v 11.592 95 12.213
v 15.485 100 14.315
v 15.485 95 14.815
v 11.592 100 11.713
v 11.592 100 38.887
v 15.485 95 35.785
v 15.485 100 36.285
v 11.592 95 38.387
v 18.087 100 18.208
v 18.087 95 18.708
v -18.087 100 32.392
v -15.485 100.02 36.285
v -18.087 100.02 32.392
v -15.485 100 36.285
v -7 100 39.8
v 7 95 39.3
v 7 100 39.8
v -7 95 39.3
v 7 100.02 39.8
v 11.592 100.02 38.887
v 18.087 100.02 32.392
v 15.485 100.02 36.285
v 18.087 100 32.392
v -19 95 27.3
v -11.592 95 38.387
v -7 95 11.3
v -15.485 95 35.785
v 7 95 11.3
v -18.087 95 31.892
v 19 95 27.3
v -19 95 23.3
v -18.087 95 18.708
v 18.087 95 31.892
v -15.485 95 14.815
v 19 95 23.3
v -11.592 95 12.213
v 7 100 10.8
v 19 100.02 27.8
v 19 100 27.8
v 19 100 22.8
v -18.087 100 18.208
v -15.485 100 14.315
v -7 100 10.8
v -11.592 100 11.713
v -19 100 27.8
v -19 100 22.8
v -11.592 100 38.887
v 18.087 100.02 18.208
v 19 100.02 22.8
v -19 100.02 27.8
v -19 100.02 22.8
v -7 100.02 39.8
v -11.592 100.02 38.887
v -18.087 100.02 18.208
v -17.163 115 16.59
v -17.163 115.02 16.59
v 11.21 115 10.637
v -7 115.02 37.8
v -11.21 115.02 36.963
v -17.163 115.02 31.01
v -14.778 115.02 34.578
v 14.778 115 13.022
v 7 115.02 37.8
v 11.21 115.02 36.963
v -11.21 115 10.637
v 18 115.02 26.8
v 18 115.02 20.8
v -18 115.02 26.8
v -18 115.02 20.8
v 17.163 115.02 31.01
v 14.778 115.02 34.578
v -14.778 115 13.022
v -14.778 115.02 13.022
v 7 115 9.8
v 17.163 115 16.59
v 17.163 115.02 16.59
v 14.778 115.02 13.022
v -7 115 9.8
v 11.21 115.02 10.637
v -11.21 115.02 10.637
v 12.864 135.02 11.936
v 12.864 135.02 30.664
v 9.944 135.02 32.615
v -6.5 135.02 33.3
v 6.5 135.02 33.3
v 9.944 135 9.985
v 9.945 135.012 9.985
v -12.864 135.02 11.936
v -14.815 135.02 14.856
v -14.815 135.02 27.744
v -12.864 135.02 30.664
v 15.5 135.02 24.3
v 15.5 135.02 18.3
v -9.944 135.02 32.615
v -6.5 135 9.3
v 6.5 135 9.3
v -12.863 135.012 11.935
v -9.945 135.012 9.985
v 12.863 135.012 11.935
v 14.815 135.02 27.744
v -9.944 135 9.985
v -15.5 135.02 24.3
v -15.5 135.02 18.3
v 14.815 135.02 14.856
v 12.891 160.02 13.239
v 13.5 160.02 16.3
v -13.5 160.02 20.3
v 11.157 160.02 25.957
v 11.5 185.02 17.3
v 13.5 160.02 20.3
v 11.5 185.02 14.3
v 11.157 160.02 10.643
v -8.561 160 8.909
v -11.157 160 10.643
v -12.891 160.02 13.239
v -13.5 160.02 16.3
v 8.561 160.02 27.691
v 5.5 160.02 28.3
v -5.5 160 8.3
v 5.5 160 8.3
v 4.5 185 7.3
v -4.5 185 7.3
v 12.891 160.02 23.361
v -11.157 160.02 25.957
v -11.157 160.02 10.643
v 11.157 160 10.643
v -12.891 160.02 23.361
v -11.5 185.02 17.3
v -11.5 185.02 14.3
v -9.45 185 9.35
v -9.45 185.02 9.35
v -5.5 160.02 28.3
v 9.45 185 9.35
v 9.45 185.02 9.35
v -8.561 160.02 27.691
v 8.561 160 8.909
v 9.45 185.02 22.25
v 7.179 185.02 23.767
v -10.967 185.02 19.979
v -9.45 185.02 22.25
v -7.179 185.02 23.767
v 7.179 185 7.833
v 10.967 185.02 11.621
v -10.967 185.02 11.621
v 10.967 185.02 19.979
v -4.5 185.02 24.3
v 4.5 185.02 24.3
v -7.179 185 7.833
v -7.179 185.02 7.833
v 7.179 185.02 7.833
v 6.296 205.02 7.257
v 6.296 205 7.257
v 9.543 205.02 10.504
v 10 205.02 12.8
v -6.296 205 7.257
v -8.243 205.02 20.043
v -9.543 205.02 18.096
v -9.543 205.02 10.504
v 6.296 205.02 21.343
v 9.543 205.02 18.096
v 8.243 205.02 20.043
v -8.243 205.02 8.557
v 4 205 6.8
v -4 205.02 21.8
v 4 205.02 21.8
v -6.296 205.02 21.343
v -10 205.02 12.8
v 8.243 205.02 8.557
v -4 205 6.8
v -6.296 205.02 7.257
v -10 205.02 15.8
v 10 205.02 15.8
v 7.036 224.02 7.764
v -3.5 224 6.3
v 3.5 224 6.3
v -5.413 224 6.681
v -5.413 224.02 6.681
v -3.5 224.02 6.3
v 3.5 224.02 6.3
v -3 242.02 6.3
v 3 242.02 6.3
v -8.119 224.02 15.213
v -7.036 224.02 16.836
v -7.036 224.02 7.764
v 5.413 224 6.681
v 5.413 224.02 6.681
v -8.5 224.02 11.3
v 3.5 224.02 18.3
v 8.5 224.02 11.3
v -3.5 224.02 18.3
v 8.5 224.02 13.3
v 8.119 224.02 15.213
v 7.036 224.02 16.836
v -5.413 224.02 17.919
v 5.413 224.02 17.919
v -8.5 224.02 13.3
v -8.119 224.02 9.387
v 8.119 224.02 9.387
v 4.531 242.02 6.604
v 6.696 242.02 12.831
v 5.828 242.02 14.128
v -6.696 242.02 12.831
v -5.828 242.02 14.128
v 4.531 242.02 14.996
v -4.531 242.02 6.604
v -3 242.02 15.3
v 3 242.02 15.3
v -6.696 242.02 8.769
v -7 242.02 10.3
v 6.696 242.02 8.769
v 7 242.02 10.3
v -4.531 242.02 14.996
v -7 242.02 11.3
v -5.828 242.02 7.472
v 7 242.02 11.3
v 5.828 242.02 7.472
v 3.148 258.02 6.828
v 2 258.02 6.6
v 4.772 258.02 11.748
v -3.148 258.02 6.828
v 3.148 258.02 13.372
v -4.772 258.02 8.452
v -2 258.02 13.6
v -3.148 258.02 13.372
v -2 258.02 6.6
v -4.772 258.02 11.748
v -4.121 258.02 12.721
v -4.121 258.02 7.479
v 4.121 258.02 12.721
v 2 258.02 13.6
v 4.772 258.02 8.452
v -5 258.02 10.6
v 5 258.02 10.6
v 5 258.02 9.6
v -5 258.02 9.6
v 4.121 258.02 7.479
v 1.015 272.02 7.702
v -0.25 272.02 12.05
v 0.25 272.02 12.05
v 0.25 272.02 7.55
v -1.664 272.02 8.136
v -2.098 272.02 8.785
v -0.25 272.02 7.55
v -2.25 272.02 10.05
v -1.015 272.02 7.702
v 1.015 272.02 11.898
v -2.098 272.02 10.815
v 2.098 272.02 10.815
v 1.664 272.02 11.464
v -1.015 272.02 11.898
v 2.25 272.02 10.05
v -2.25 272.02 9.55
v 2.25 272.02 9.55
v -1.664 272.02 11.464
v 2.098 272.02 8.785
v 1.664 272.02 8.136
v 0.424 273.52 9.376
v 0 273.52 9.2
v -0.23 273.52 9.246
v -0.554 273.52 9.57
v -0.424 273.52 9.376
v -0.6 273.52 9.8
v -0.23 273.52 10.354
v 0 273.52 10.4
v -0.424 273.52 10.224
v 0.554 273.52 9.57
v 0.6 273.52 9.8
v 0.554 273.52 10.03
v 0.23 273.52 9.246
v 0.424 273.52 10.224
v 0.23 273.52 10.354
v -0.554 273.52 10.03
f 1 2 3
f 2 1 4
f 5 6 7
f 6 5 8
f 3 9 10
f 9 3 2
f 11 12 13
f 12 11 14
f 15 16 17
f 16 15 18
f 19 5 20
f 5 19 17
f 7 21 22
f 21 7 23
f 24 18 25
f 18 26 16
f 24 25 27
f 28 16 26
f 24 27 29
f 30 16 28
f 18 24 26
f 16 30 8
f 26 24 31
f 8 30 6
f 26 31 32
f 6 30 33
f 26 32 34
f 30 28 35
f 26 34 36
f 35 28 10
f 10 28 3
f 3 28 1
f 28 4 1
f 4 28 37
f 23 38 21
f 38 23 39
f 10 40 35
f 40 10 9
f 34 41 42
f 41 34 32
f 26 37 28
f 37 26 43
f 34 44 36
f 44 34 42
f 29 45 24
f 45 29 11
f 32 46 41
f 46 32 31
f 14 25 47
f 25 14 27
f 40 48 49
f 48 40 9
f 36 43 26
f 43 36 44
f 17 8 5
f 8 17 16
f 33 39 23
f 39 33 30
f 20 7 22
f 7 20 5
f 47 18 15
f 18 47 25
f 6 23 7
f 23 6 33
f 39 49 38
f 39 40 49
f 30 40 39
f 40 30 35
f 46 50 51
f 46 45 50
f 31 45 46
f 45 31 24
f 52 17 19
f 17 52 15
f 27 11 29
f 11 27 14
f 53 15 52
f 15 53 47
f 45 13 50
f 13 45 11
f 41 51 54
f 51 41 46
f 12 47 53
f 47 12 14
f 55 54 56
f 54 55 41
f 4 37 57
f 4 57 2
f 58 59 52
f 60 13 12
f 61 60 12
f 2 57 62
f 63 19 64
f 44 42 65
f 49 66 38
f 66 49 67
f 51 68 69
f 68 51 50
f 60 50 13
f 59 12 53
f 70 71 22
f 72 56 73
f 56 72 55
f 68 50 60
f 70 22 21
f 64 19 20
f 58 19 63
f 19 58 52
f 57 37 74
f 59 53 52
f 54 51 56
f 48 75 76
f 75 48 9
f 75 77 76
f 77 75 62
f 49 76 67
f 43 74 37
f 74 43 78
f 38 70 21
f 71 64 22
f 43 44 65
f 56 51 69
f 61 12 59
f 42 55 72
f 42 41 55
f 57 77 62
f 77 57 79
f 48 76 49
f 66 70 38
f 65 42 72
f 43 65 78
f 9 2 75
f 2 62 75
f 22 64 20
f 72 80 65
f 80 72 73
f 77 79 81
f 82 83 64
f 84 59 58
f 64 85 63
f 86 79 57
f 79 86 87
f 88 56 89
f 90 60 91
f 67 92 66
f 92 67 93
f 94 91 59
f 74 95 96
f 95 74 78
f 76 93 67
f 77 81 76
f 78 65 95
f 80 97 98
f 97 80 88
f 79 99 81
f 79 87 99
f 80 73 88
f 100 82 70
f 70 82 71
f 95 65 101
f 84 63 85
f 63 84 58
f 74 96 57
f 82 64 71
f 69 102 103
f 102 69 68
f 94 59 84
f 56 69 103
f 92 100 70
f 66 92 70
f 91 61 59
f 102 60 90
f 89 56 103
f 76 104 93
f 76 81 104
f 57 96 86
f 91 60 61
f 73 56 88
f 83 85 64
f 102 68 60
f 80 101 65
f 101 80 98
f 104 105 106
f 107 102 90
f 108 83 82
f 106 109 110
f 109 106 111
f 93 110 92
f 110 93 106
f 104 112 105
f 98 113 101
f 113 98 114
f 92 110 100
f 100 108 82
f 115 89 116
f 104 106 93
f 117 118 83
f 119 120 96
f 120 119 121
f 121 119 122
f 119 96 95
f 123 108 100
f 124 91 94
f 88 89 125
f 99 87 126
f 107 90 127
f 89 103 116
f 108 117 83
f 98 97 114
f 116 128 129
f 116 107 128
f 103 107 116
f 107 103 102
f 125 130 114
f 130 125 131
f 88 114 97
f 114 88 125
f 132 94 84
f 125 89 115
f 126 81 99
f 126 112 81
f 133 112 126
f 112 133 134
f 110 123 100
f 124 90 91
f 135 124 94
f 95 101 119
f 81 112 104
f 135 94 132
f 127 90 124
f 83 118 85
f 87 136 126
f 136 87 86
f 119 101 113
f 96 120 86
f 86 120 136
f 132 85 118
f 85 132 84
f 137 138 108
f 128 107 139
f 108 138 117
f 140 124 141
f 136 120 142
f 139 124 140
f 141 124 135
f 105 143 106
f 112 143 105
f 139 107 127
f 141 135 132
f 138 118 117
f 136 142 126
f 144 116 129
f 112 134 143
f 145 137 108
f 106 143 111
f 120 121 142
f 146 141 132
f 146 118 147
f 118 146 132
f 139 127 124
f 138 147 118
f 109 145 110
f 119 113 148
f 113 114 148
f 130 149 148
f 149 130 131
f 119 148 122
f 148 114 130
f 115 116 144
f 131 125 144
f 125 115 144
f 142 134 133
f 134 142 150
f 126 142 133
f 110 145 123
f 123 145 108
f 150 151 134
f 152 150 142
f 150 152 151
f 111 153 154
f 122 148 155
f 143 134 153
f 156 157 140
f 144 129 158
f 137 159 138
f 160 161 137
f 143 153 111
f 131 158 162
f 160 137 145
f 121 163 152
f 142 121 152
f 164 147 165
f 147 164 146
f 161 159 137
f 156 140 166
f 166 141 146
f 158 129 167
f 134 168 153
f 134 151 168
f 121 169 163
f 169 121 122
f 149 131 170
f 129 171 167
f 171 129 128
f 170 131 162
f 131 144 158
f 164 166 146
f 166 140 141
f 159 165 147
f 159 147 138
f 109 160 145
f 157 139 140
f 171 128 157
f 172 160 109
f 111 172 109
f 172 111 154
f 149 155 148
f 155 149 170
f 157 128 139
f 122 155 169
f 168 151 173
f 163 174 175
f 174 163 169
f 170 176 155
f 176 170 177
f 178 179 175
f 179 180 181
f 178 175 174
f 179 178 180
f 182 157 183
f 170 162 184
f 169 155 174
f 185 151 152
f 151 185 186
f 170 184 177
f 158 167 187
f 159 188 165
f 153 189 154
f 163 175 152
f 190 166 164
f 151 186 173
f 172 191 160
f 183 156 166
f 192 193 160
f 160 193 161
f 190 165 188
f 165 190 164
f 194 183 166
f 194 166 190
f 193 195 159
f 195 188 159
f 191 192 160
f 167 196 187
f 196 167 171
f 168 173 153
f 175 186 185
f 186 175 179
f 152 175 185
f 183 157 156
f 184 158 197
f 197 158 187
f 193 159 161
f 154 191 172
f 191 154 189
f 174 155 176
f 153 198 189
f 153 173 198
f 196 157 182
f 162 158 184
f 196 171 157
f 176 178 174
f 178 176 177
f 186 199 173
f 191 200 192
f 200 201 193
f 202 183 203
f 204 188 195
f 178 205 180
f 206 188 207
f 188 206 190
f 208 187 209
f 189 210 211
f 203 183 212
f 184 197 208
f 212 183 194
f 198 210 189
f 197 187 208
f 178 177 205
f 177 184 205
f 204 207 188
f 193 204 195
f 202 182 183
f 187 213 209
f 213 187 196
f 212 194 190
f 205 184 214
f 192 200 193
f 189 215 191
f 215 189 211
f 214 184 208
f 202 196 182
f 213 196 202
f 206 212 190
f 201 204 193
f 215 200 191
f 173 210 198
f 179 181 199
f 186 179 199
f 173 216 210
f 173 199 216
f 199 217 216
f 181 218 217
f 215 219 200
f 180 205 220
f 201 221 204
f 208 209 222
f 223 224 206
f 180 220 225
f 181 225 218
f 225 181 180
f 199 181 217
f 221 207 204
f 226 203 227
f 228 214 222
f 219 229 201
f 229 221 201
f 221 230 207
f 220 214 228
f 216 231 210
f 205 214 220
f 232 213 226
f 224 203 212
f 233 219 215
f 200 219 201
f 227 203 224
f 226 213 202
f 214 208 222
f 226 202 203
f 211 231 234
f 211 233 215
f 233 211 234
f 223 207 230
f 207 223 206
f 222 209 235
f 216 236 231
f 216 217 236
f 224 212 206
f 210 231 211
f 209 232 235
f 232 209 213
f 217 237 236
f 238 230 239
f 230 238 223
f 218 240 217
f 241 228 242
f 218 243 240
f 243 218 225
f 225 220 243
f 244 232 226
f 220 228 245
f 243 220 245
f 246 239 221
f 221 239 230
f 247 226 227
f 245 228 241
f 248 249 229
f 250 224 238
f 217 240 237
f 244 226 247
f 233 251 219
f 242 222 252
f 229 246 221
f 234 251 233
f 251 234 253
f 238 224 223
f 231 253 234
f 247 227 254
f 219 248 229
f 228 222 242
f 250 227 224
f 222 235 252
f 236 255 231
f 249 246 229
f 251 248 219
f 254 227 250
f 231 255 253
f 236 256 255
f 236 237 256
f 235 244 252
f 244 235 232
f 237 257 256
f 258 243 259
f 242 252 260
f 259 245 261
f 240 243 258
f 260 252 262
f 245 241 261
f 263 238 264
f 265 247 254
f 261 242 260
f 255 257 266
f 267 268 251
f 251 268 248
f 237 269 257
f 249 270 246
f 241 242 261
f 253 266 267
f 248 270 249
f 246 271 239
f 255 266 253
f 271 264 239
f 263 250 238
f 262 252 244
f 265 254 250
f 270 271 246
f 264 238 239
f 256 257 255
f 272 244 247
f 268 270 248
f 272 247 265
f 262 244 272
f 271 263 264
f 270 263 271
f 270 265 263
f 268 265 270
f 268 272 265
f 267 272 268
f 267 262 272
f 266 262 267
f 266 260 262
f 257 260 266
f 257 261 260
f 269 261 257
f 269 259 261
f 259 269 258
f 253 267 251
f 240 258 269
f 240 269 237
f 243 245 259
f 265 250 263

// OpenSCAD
// file: ../lib.scad
// ===== 공용 프리미티브 (params 의존 없음 — use로 포함. 함정 1) =====

// 두 점을 잇는 캡슐. 끝단이 od/2 만큼 뻗는다 (함정 3)
module rod(p1, p2, od, fn = 56)
    hull() { translate(p1) sphere(d = od, $fn = fn);
             translate(p2) sphere(d = od, $fn = fn); }

function mir(p, s = 1) = [s * p.x, p.y, p.z];

// --- 라운디드 사각 2D 폴리곤 (CCW) ---
function arc_pt(cx, cy, r, a) = [cx + r * cos(a), cy + r * sin(a)];
function rrpts(w, h, r, n = 4) =
    let (x = w / 2 - r, y = h / 2 - r)
    concat(
        [for (i = [0:n]) arc_pt( x, -y, r, -90 + 90 * i / n)],
        [for (i = [0:n]) arc_pt( x,  y, r,   0 + 90 * i / n)],
        [for (i = [0:n]) arc_pt(-x,  y, r,  90 + 90 * i / n)],
        [for (i = [0:n]) arc_pt(-x, -y, r, 180 + 90 * i / n)]);

// y 위치의 XZ 단면 슬래브 (중심 x0/zc, 폭 w/높이 h, 모서리 r).
// 회전 매핑: 2D x→차량 X, 2D y→차량 Z, 돌출 +z→−Y (y..y+0.02 전방 전용, 함정 20)
module slabr(y, x0, w, h, zc, r)
    translate([x0, y + 0.02, zc]) rotate([90, 0, 0])
        linear_extrude(0.02) polygon(rrpts(w, h, r));

// 단면 체인 loft: sec = [[y, x0, w, h, zc, r], ...]
module loftr(sec)
    for (i = [0 : len(sec) - 2])
        hull() {
            slabr(sec[i][0],     sec[i][1],     sec[i][2],     sec[i][3],     sec[i][4],     sec[i][5]);
            slabr(sec[i + 1][0], sec[i + 1][1], sec[i + 1][2], sec[i + 1][3], sec[i + 1][4], sec[i + 1][5]);
        }

// 라운디드 박스 (z0..z1 수직, 평면 모서리 r)
module rbox(xc, yc, z0, z1, dx, dy, r, fn = 32)
    hull() for (px = [-1, 1], py = [-1, 1])
        translate([xc + px * (dx / 2 - r), yc + py * (dy / 2 - r), z0])
            cylinder(r = r, h = z1 - z0, $fn = fn);

// --- NACA 계열 에어포일 (LE 원점, 2D +x = 현 방향) ---
function _yt(x, c, t) = 5 * t * c * (0.2969*sqrt(x) - 0.1260*x - 0.3516*x*x
    + 0.2843*x*x*x - 0.1036*x*x*x*x);
function _yc(x, c, m) = 4 * m * c * x * (1 - x);
function naca_pts(c, t, m, n = 12) =
    concat(
        [for (i = [0:n])     let (x = i / n)     [x*c,  _yt(x, c, t) + _yc(x, c, m)]],
        [for (i = [n-1:-1:0]) let (x = i / n)    [x*c, -_yt(x, c, t) + _yc(x, c, m)]]);

// 슬라이스 3D 링: v=[x, yle, zle, c, aoa, th, cam] → 받각 회전된 naca 점의 링
// (th/cam은 mm — 현 대비 비율로 정규화)
function wring(v, n = 12) =
    let (c = v[3], t = v[5] / c, m = v[6] / c, pts = naca_pts(c, t, m, n),
         ca = cos(v[4]), sa = sin(v[4]))
    // 코드 방향 (ca,sa) + 두께/캠버 수직 방향 (-sa,ca) — 2D y 누락 금지
    [for (p = pts) [v[0], v[1] + p[0] * ca - p[1] * sa, v[2] + p[0] * sa + p[1] * ca]];

// 진짜 로프트 윙 — polyhedron 스트립. hull 체인은 캠버진 하면을 볼록 껍질로
// 채워(LE→TE 직선 웨지) 요소가 처지므로 쓰지 않는다
module wing3(sl, n = 12) {
    rings = [for (v = sl) wring(v, n)];
    ns = len(rings);
    m = len(rings[0]);
    pts = [for (r = rings, p = r) p];
    function ix(i, k) = i * m + (k % m);
    faces = concat(
        // 측면 스트립 (사중면 → 삼각형 2) — 외향 노멀 권선(캡과 일치)
        [for (i = [0 : ns - 2], k = [0 : m - 1])
            each [[ix(i, k), ix(i, k + 1), ix(i + 1, k + 1)],
                  [ix(i, k), ix(i + 1, k + 1), ix(i + 1, k)]]],
        // 끝 캡 (링은 단순 폴리곤 — 팬 삼각분할)
        [for (k = [1 : m - 2]) [ix(0, 0), ix(0, k + 1), ix(0, k)]],
        [for (k = [1 : m - 2]) [ix(ns - 1, 0), ix(ns - 1, k), ix(ns - 1, k + 1)]]
    );
    polyhedron(points = pts, faces = faces, convexity = 4);
}

// 반쪽 슬라이스 → x-대칭 전체. 규약: half는 센터(x=0)→팁 순서(내림차순 x).
// 결과는 x 오름차순 체인. x=0 센터만 중복 제외 (그 외 전부 미러)
function wsym(half) =
    concat([for (i = [len(half) - 1 : -1 : 0]) half[i]],
           [for (i = [0 : len(half) - 1]) if (abs(half[i][0]) > 1e-9)
               concat([-half[i][0]], [for (j = [1 : len(half[i]) - 1]) half[i][j]])]);

// 환(링), 축 Z
module ann(r_in, r_out, h, fn = 96)
    difference() { cylinder(r = r_out, h = h, center = true, $fn = fn);
                   cylinder(r = r_in,  h = h + 2, center = true, $fn = fn); }

// 리스트 전체 x반전+순서 역행 (센터 구간 없는 플랩 등 — 좌우 별도 wing3 호출용).
// x반전만 하면 행렬식이 음수가 되어 권선이 뒤집힌다 → 순서 역행으로 상쇄
function msym(half) =
    [for (i = [len(half) - 1 : -1 : 0])
        concat([-half[i][0]], [for (j = [1 : len(half[i]) - 1]) half[i][j]])];
// file: ../params.scad
// =====================================================================
// F1 그랜드파이언스 카 1:10 — 전체 파라미터 (유일한 수정 지점)
// 좌표계: +Y 전방, +X 좌측, +Z 상방, 지면 z=0, 원점=휠베이스 중심
// 전장 558 (y -268..+278), 전폭 194, 휠베이스 360, 타이어 OD 72 (720mm)
// 30부품. loftr 단면 = [y, x0, w, h, zc, r] (XZ 단면, y..y+0.02 슬래브)
// wing3 슬라이스 = [x, yle, zle, c, aoa, th, cam]
//   aoa: 현 방향의 X축 회전각. 전방 받각 요소는 165~170 (TE가 뒤+위)
// =====================================================================
$fn = 96;

// -- 휠/액슬 (실차 720mm 타이어, 18인치 림, 트랙 F1600/R1550) --
AXF_Y = 180;   AXR_Y = -180;
WHF_X = 80;    WHR_X = 77.5;
WH_Z  = 36;
TIRF_W = 30.5; TIRR_W = 40.5;  TIR_R = 36;
TIR_FN = 288;                 // 타이어 회전체 해상도
RIM_R = 23.2;  RIM_T = 1.0;   // 림 배럴 반경/두께
RIM_LF = 12.4; RIM_LR = 17.4; // 림 배럴 반폭
HUB_BORE = 7.0; STUB_D = 6.2; // 방사 간극 0.4
DISC_R = 15.5;                // 브레이크 디스크

// -- 바디 공통 레벨 --
FLO_Z0 = 2.0;  FLO_Z1 = 5.5;  // 플로어 (두께 3.5)
BOD_Z0 = 5.65;                // 샤시/카버/기어박스 바닥 (플로어 위 0.15)
J = 0.15;                     // 부품 접합 기본 간극
ARM_OD = 3.4;                 // 서스펜션 암 캡슐 직경

// ===== 01 플로어 =====
FLOOR_SEC = [
    [132,    0,  92, 3.5, 3.75, 1.5], [100, 0, 118, 3.5, 3.75, 1.5],
    [60,     0, 130, 3.5, 3.75, 2.0], [10,  0, 132, 3.5, 3.75, 2.0],
    [-60,    0, 128, 3.5, 3.75, 2.0], [-120, 0, 112, 3.5, 3.75, 2.0],
    [-161.85, 0, 100, 3.5, 3.75, 2.0]];

// ===== 02 디퓨저 (램프 + 스트레이크는 부품 내부) =====
DIFF_SEC = [
    [-230,   0, 100, 10.0, 11.0, 1.5], [-215, 0, 100, 8.0,  9.0, 1.5],
    [-190,   0, 100,  6.0,  6.2, 1.5], [-162.0, 0, 100, 4.0, 4.15, 1.5]];
DIFF_TOP = [[-175, 7.8], [-205, 11.9], [-228, 15.6]];  // (y, 램프 상면 z)

// ===== 03 플로어 에지 윙 =====
FEW_SEC = [   // [y, x0, w, h, zc, r] — x0 부호로 좌우
    [55,   63.5, 3.0, 2.0, 6.65, 1.0], [-5,  65.5, 3.0, 5.5, 8.40, 1.5],
    [-70,  63.0, 3.0, 4.0, 7.65, 1.5], [-120, 58.0, 3.0, 3.0, 7.15, 1.5]];
FEW2_SEC = [
    [100, 57.0, 2.5, 1.5, 6.40, 0.8], [60, 60.0, 2.5, 2.0, 6.65, 0.8]];

// ===== 04 노우즈 =====
NOSE_SEC = [
    [95,   0, 38, 28, 25.3, 12], [100,  0, 38, 29, 25.3, 12],
    [115,  0, 36, 28, 23.8, 11], [135,  0, 31, 24, 21.3,  9],
    [160,  0, 27, 20, 18.3,  8], [185,  0, 23, 17, 15.8,  7],
    [205,  0, 20, 15, 14.3,  6], [224,  0, 17, 12, 12.3,  5],
    [242,  0, 14,  9, 10.8,  4], [258,  0, 10,  7, 10.1,  3],
    [272,  0,  4.5, 4.5, 9.8, 2], [273.5, 0, 1.2, 1.2, 9.8, 0.6]];

// ===== 05 샤시(모노코크) + 콕핏 컷 =====
CHAS_SEC = [
    [-34.85, 0, 46, 44, 27.65, 15], [-10, 0, 48, 46, 28.65, 15],
    [20,     0, 48, 44, 27.65, 15], [60,  0, 46, 40, 25.65, 14],
    [94.85,  0, 42, 34, 22.65, 12]];
CKP_CUT = [[62, 0, 34, 32, 46, 3], [-30, 0, 34, 30, 45, 3]];

// ===== 06 엔진 커버 + 샤크핀 =====
COV_SEC = [
    [-152,   0,  8, 14, 35.65,  6], [-140, 0, 12, 18, 32.65,  7],
    [-120,   0, 18, 24, 29.65,  9], [-95,  0, 26, 30, 26.15, 11],
    [-70,    0, 34, 36, 25.65, 13], [-50,  0, 40, 40, 25.65, 14],
    [-35.15, 0, 44, 42, 26.65, 15]];
FIN_SEC = [
    [-162, 0, 2.2, 44, 62.0, 1], [-120, 0, 2.5, 30, 56.0, 1],
    [-92.2, 0, 2.5, 10, 45.0, 1]];

// ===== 07 에어박스 (험프 + 인테이크 링) =====
ABX_SEC = [
    [-92, 0, 14, 17, 50.00, 6], [-68, 0, 20, 24, 56.60, 8],
    [-46, 0, 22, 26, 59.60, 8], [-34, 0, 22, 13, 56.30, 6]];
ABX_RING_C = [0, -45, 73.5];  ABX_RING_R = 11;  ABX_RING_T = 4.5;
ABX_RING_SZ = 0.72;

// ===== 08 사이드포드 (x0=±41.5) =====
SPOD_X0 = 41.5;
SPOD_SEC = [   // [y, w, h, zc, r]
    [38,   34, 26, 18.65, 8], [5,   34, 28, 19.65, 9], [-25,  34, 26, 18.65, 9],
    [-55,  32, 21, 18.15, 8], [-80, 30, 15, 17.15, 8], [-100, 26,  9, 16.15, 7]];
SPOD_INLET = [24, 18, 19, 2.3];  // 컷: w, h, zc, 깊이

// ===== 09 할로 =====
HALO_N = 28;  HALO_OD = 9;
HALO_RX = 22; HALO_RY = 44; HALO_CY = 12;  // 타원 계획면(평면도)
HALO_Z0 = 75; HALO_ZA = 2;                 // z(t) = Z0 + ZA*cos(t)

// ===== 10/11/12/13 프런트 윙 =====
FW_MAIN_HALF = [   // 반쪽(x≤0) — wsym()로 전체화
    [0,    258.3, 2.4, 20, 170, 1.4, 2.0],
    [-16,  259.0, 3.4, 27, 165, 1.6, 2.4],
    [-40,  260.0, 3.6, 40, 166, 1.8, 2.8],
    [-60,  257.0, 4.0, 37, 167, 1.7, 2.6],
    [-80,  258.0, 4.4, 31, 166, 1.6, 2.2],
    [-95.2, 263.0, 4.6, 26, 166, 1.5, 1.8]];
FW_F1_HALF = [
    [-16,  253.0, 8.0, 22, 155, 1.3, 4.0],
    [-40,  250.5, 8.2, 26, 156, 1.4, 4.2],
    [-60,  249.5, 8.4, 26, 157, 1.4, 4.2],
    [-80,  250.0, 8.6, 24, 158, 1.4, 4.0],
    [-95.2, 254.0, 8.8, 21, 158, 1.3, 3.5]];
FW_F2_HALF = [
    [-16,  258.0, 12.4, 17, 147, 1.2, 4.5],
    [-40,  255.5, 12.6, 20, 148, 1.3, 4.8],
    [-60,  254.5, 12.8, 20, 149, 1.3, 4.8],
    [-80,  254.5, 13.0, 19, 150, 1.3, 4.5],
    [-95.2, 258.0, 13.2, 17, 150, 1.2, 4.0]];
FW_EP_X = 96.3;  FW_EP_T = 1.5;   // 엔드플레이트 x 중심/두께
FW_EP_PTS = [    // (y,z) 아웃라인
    [226, 1.5], [266, 1.5], [266, 8], [263, 24.5], [252, 24.5],
    [244, 17], [233, 15], [226, 9]];
FW_MT_SEC = [   // 마운트 플레이트 [y, x0(±2.6), w, h, zc, r] — 노우즈 저면 라운딩 회피
    [244, 2.6, 1.6, 1.8, 5.25, 0.5], [250, 2.6, 1.6, 1.8, 5.25, 0.5]];

// ===== 14 리어 윙 =====
RW_MAIN = [
    [-50.8, -212, 57.5, 46, 162, 2.2, -3.5], [-25, -211, 56.6, 47, 162, 2.3, -4.0],
    [0,     -210, 54.2, 47, 162, 2.3, -4.0], [25,  -211, 56.6, 47, 162, 2.3, -4.0],
    [50.8,  -212, 57.5, 46, 162, 2.2, -3.5]];
RW_FLAP = [
    [-49.6, -234,   71.8, 30, 155, 1.8, -4.5],
    [0,     -235.5, 73.0, 30, 155, 1.8, -4.5],
    [49.6,  -234,   71.8, 30, 155, 1.8, -4.5]];
RW_EP_X = 52;  RW_EP_T = 2;
RW_EP_PTS = [
    [-200, 46], [-268, 46], [-268, 60], [-262, 93], [-250, 93],
    [-243, 72], [-218, 64], [-202, 74]];
RW_DRS = [-245, 79.4, 5.0, 2.6, 3.0];   // 팟: y, z, w, h, 두께

// ===== 15 빔 윙 =====
BEAM_E1 = [
    [-50.9, -204.5, 31.5, 16, 162, 1.8, -2.5], [0, -205.5, 30.4, 16, 162, 1.8, -2.5],
    [50.9,  -204.5, 31.5, 16, 162, 1.8, -2.5]];
BEAM_E2 = [
    [-50.9, -210, 36.8, 15, 158, 1.6, -3.0], [0, -211, 35.6, 15, 158, 1.6, -3.0],
    [50.9,  -210, 36.8, 15, 158, 1.6, -3.0]];
BEAM_PLATE = [-214, -200.15, 8.2, 22, 31];  // 마운트 플레이트 y1,y0,x반폭,z0,z1

// ===== 16 리어윙 파일론(쌍둥 스완넥) =====
RW_PYL = [[-158, 55.0], [-190, 58.0], [-212.5, 63.0]];  // (y, z), x=±5.4
RW_PYL_X = 5.4;  RW_PYL_OD = 8;

// ===== 17 미러 =====
MIR_BASE = [14, 63, 46.0];  MIR_HOUSE = [31, 66, 56.5];

// ===== 18 헬멧 =====
HELM_C = [0, 0, 55];  HELM_R = 11.5;
HELM_SC = [1, 1.18, 1.02];

// ===== 19 콕핏 트림 =====
SEAT_SEC  = [[30, 0, 26, 13.2, 36.75, 3], [-10, 0, 26, 13.2, 36.75, 3]];
HREST_SEC = [[12, 0, 32, 15, 53.5, 5], [-20, 0, 32, 15, 53.5, 5]];

// ===== 20 스티어링 휠 =====
SW_C = [0, 40, 47];  SW_TILT = 20;

// ===== 21/22 서스펜션 (픽업=[x, y, z], 암 끝은 업라이트 내부) =====
FUP = [61, 183, 46];  FLO_BALL = [61.5, 181, 24];  FTR = [61.5, 177, 35];
FPU = [61.5, 180, 27];
F_ARM = [   // [픽업, 볼]
    [[12.0, 206, 20.0], FUP],  [[16.0, 152, 23.0], FUP],
    [[11.9, 208,  9.3], FLO_BALL], [[16.3, 150, 12.0], FLO_BALL],
    [[15.6, 162, 14.0], FTR]];
F_PUSH = [[11.8, 198, 24.4], FPU];
RUP = [53.5, -182, 46];  RLO = [54, -179, 23];  RDRIVE_O = [52, -180, 31];
R_ARM = [
    [[13.3, -160, 47.0], RUP], [[13.3, -198, 45.0], RUP],
    [[12.8, -158, 20.4], RLO], [[9.2, -202, 19.6], RLO]];
R_PULL = [[12.6, -177, 23.75], [53.5, -181, 44]];
R_DRIVE = [[13.2, -180, 17.0], RDRIVE_O];

// ===== 23/24 브레이크 스쿱 =====
SCOOP_F = [[164.2, 59.5, 7, 11, 30, 3], [158, 58.5, 5.5, 8, 28.5, 2.5]];
SCOOP_R = [[-164.2, 48, 7, 10, 29, 3], [-158, 46, 5, 7.5, 27.5, 2.5]];

// ===== 25~28 타이어/림 =====
TIRE_BEAD = 2.6;   // 비드 안쪽 세팅 (단면 반경 23.4)

// ===== 29 기어박스 + 리어 크래시 =====
GEAR_SEC = [
    [-258,   0,  4,  1.8, 15.00, 1.5], [-252, 0,  6,  1.6, 16.30, 2],
    [-230,   0,  9,  1.4, 18.30, 3],   [-208, 0, 12,  4.9, 15.05, 4],
    [-195,   0, 16,  9.35, 14.83, 5],   [-170, 0, 20, 15.1, 15.45, 6],
    [-145,   0, 22, 15.95, 13.60, 7],  [-117.85, 0, 26, 8.6,  9.95, 8]];
GEAR_TOWER = [-200, -158, 8, 11.3, 28, 50];  // y1,y0,x내측,x외측,z0,z1
RAIN_LT = [-258.6, 5, 4];   // y면, w, h

// ===== 30 카메라/안테나 =====
TCAM_Y = -45;  TCAM_Z0 = 84.8;
SIDECAM = [[194, 19.0], [202, 18.5]];  // (y, z) — x는 노우즈 반폭+0.15
ANT = [[4, 70], [-4, 70]];             // (x, y) — chassis 탑
// main file
// 04 노우즈 — 플랫 바닥 슬렌더 노우즈 콘
include <../params.scad>
use <../lib.scad>

module nose() loftr(NOSE_SEC);

nose();
